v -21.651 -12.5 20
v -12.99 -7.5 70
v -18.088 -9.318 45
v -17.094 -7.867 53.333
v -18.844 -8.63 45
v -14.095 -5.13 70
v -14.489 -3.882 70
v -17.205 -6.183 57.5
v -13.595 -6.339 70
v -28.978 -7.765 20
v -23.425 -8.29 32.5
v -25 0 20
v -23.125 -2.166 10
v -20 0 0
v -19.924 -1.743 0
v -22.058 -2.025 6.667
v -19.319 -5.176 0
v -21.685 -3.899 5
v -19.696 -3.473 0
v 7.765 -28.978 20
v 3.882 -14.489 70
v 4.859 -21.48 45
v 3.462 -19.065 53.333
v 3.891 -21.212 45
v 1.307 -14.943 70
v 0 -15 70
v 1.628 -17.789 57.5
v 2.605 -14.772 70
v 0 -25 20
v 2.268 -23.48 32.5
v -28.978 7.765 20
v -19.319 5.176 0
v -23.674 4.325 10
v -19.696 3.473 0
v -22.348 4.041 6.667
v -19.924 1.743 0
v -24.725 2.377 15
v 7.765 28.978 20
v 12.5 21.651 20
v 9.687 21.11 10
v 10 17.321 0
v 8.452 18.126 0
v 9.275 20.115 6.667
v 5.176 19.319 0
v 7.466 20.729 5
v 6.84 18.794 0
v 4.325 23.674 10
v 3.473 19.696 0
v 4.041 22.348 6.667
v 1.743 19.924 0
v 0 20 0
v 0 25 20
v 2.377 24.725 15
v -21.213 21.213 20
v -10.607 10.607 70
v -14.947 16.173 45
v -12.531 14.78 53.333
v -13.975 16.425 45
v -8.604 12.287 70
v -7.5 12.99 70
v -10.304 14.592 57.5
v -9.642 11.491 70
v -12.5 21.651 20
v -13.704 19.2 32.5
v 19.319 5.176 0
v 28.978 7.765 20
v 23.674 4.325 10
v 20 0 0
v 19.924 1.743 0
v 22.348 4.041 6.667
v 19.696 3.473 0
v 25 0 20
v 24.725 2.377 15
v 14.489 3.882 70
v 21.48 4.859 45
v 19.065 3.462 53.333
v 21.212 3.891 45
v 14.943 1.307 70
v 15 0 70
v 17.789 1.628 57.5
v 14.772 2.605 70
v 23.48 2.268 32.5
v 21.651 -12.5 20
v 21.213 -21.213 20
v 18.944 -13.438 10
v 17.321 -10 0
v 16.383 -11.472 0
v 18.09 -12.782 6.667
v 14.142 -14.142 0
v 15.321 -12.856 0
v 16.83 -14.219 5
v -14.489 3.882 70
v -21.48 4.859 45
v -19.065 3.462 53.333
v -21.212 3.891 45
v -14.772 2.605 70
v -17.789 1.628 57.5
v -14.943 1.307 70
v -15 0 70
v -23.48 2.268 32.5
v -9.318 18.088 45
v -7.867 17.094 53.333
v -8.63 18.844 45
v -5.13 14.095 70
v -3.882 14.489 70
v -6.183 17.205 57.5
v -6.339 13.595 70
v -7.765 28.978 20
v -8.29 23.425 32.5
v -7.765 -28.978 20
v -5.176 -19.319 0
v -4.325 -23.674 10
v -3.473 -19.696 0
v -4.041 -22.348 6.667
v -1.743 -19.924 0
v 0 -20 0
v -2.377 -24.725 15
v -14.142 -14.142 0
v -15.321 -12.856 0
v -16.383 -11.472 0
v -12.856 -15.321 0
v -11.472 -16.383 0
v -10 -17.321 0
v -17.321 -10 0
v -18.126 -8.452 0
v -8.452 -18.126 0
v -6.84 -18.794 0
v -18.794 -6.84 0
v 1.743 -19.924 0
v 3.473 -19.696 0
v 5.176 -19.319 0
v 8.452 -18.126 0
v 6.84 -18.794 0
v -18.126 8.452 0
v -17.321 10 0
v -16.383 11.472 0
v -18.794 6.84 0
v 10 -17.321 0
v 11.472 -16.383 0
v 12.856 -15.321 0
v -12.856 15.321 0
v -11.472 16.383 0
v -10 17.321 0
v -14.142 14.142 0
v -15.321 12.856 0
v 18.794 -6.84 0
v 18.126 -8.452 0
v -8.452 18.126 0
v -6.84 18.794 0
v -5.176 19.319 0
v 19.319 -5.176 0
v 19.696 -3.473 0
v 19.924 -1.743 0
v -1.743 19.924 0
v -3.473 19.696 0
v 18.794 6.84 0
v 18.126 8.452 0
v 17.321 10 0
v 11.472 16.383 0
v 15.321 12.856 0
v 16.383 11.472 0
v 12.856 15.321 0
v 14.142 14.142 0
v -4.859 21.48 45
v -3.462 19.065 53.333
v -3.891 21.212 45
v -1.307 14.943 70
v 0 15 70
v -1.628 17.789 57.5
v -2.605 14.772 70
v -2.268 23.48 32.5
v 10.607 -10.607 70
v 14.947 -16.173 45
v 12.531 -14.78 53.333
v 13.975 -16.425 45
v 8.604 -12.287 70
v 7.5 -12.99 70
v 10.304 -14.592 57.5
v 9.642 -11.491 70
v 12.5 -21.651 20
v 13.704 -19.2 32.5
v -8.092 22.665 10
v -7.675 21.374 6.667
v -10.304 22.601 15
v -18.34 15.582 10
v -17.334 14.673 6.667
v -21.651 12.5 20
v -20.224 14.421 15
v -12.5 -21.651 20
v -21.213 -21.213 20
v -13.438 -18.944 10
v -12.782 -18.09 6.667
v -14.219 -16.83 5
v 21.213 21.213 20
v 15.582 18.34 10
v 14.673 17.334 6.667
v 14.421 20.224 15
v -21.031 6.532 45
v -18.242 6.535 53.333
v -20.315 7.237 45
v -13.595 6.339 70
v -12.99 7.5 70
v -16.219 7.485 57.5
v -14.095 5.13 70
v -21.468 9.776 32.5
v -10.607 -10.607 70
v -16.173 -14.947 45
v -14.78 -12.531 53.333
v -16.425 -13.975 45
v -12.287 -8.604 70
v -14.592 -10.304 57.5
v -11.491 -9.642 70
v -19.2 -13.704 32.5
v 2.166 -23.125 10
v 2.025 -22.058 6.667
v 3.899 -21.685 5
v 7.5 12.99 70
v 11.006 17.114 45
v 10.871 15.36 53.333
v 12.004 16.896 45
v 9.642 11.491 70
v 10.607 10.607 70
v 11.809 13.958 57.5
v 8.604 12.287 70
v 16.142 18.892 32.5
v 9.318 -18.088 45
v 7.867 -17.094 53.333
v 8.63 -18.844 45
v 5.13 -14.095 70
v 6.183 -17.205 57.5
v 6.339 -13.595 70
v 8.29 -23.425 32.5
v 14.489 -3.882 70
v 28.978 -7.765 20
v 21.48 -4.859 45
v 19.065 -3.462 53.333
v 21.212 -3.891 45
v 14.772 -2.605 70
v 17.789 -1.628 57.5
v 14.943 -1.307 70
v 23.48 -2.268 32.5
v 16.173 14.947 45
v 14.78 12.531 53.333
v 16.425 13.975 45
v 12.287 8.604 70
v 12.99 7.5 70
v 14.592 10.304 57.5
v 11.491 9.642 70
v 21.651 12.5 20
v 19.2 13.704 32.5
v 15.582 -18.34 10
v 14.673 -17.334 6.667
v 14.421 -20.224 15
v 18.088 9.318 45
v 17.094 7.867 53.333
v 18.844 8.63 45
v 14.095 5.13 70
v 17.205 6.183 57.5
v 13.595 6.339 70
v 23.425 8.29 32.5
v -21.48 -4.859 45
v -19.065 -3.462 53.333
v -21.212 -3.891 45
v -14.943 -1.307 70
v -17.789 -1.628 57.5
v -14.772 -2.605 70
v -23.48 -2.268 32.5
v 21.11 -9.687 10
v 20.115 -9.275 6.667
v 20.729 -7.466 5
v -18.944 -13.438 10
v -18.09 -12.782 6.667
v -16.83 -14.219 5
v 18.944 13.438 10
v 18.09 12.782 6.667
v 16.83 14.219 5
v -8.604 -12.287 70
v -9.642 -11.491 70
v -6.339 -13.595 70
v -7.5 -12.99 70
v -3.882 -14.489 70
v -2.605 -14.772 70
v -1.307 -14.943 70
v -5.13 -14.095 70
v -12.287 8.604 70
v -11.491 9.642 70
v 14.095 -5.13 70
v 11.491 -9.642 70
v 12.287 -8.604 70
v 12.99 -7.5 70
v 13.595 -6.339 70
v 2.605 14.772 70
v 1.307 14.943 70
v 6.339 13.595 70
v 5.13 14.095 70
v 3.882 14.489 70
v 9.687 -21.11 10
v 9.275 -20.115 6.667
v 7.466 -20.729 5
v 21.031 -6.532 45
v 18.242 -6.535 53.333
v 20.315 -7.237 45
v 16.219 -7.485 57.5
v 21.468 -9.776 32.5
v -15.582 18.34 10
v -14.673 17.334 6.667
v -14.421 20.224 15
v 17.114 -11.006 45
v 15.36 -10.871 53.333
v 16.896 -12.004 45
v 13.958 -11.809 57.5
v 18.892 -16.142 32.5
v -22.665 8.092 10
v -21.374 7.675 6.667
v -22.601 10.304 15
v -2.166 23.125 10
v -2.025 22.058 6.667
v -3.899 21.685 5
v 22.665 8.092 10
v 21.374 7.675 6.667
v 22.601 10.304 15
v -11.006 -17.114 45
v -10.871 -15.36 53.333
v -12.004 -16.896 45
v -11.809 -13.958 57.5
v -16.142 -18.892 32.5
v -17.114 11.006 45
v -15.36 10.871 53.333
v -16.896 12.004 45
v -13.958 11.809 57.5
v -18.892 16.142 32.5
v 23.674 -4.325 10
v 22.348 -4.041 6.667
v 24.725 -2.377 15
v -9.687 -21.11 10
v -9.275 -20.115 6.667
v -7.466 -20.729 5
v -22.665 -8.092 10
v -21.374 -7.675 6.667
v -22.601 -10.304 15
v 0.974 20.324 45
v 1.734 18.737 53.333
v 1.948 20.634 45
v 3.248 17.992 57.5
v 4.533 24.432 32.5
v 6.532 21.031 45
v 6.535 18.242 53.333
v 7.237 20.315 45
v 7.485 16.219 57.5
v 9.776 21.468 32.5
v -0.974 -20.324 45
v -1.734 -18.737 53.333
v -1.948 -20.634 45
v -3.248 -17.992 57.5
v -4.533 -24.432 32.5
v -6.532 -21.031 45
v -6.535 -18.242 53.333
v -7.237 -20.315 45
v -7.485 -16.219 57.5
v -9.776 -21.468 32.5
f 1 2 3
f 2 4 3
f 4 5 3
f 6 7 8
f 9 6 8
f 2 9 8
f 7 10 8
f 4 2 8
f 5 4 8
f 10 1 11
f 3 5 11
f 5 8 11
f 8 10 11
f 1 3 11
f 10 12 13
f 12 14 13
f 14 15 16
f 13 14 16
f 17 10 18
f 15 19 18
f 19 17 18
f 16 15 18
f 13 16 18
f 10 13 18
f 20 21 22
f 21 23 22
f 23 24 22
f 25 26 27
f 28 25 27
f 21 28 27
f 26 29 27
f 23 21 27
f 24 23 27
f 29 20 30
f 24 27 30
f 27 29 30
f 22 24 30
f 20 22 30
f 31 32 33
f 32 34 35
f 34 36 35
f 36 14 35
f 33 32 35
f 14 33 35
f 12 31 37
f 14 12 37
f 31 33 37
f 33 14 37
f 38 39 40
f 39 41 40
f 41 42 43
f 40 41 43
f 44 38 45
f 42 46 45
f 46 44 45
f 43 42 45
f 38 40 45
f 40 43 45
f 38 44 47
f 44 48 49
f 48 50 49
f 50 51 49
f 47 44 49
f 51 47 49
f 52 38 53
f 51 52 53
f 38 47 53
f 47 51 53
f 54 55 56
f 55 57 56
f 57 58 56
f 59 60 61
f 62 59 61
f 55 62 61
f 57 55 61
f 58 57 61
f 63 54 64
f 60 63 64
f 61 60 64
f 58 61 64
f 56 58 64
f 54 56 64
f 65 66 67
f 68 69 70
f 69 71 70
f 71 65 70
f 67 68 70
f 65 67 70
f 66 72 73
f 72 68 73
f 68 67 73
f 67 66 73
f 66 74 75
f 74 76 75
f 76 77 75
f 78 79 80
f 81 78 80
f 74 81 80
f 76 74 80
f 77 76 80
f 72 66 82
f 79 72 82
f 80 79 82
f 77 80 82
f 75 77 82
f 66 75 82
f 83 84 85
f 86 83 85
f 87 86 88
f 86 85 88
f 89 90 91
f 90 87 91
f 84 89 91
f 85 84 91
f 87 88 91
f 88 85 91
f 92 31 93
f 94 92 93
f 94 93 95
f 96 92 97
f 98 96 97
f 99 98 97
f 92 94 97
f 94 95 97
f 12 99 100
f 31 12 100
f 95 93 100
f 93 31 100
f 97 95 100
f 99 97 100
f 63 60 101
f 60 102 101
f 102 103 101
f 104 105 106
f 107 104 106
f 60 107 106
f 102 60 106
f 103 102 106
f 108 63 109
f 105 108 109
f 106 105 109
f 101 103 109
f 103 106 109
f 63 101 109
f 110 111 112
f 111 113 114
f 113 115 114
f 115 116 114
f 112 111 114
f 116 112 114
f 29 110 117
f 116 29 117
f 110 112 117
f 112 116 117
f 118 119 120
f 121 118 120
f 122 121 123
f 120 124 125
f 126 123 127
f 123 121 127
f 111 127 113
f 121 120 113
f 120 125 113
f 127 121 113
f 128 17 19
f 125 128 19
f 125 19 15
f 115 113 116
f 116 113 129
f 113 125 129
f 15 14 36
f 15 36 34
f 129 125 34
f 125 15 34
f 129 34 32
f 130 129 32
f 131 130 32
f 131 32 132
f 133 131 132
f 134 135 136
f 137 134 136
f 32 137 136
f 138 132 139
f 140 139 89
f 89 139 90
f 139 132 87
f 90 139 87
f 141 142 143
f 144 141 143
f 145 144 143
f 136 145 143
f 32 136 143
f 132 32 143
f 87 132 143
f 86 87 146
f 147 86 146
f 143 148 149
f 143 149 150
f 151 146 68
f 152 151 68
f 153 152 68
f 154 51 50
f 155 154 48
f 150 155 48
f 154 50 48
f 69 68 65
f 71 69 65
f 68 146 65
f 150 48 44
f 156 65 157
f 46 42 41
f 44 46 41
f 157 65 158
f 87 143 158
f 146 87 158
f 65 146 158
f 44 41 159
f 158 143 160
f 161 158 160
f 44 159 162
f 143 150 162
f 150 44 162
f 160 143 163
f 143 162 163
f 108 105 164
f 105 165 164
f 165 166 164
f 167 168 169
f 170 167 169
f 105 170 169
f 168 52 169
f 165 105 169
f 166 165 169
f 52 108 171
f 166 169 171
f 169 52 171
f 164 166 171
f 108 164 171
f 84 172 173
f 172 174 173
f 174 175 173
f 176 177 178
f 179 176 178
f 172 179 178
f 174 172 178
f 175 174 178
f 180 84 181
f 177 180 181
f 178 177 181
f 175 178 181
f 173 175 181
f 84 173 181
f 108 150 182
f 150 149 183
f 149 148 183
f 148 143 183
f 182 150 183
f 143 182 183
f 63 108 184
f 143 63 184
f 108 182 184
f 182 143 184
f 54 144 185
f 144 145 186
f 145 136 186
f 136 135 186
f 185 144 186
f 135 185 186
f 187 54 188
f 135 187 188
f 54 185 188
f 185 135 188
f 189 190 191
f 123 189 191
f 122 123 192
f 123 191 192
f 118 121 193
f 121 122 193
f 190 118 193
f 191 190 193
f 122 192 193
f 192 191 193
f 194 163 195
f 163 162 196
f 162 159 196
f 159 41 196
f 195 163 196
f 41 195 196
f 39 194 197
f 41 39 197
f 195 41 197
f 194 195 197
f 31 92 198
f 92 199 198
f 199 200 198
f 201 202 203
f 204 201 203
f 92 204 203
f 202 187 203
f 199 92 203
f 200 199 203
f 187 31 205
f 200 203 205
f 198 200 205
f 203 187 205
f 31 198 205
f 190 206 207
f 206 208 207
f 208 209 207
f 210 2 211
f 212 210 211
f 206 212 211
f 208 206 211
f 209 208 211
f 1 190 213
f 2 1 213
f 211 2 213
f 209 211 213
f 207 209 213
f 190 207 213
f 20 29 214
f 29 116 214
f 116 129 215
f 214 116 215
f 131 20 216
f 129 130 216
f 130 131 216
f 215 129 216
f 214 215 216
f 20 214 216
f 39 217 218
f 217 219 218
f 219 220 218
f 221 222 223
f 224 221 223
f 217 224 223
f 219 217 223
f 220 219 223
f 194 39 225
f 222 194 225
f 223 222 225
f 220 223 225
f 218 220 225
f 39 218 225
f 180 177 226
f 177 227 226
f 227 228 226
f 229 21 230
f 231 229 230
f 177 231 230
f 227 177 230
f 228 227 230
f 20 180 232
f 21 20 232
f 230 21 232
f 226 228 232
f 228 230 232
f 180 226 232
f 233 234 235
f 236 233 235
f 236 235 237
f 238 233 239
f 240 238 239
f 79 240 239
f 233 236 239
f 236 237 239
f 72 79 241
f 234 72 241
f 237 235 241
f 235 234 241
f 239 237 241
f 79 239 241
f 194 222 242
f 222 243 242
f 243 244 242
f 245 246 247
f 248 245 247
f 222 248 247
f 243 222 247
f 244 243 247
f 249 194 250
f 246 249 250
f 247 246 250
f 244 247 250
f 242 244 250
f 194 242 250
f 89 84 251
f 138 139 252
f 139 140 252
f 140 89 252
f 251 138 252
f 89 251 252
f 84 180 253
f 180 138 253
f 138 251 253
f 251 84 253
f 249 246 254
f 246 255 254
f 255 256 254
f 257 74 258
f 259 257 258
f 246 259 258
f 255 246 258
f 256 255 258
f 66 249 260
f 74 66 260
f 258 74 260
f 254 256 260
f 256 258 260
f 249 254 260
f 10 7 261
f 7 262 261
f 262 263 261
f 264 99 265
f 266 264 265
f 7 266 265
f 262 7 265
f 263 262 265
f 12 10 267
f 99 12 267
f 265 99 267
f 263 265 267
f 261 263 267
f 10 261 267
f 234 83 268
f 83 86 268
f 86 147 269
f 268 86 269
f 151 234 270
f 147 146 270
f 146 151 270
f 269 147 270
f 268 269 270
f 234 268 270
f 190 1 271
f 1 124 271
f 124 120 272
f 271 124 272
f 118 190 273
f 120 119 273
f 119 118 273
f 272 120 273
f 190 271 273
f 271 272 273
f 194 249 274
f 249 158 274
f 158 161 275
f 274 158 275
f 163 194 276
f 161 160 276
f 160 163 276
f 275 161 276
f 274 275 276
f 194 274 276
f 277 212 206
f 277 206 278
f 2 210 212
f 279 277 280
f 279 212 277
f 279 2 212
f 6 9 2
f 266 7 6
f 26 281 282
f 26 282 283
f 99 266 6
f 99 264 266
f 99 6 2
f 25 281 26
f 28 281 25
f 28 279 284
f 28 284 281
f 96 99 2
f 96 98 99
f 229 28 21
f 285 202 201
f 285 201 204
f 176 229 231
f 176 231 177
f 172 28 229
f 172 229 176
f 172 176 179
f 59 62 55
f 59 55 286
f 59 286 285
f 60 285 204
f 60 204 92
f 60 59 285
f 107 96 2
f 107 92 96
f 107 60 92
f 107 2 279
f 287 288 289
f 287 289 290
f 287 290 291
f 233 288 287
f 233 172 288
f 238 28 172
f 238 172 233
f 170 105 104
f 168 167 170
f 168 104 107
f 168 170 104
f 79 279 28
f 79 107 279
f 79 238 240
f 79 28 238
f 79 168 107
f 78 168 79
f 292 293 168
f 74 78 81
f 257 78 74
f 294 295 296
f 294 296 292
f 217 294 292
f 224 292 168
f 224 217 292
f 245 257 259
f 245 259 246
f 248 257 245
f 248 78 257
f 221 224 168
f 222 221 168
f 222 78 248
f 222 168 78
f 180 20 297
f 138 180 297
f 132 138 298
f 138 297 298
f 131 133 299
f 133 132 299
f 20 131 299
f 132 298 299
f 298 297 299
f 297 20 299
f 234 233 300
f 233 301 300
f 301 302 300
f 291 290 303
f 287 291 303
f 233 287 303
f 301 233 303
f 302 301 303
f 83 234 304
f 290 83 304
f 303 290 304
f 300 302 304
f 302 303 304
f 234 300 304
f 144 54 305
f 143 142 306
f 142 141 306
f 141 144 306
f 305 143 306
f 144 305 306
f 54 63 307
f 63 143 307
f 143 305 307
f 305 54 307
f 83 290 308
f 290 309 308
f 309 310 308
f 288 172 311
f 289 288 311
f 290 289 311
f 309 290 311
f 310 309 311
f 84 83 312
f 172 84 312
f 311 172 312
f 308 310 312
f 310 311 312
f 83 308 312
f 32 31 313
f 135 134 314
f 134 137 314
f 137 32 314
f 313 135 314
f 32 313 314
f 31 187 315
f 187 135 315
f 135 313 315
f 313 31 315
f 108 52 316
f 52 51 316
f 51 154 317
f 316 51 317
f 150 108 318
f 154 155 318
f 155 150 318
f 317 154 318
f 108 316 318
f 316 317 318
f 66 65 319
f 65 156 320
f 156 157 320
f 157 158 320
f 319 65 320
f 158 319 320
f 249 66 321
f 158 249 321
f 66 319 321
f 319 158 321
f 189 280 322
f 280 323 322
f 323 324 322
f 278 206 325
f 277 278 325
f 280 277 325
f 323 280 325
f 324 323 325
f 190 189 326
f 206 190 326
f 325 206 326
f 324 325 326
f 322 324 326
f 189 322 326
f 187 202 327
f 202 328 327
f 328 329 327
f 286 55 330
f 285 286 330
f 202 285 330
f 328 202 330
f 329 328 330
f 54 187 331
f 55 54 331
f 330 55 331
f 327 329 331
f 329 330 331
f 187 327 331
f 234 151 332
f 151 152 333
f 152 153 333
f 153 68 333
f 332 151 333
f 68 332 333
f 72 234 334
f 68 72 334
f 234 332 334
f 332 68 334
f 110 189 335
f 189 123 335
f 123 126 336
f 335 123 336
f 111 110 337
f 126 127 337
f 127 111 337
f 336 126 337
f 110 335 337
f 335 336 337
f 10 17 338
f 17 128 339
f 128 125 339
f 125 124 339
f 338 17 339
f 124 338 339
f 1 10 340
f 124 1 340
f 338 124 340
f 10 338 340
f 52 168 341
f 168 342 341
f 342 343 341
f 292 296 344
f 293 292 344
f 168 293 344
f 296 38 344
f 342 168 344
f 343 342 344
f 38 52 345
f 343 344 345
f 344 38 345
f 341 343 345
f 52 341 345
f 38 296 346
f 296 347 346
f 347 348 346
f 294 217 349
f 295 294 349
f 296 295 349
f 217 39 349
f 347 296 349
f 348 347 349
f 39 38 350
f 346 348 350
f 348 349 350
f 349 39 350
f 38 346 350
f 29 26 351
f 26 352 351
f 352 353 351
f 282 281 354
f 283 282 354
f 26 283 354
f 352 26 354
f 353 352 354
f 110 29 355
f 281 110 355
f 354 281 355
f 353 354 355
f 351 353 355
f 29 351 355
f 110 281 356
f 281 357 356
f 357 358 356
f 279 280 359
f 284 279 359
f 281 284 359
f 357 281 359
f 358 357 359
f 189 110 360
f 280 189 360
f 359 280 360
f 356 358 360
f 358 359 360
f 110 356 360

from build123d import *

# Parameters (mm, degrees)
F0_R = 20
F5_R = 15


# Not quite as in the source:
# - a feature of the source that left no trace in its solid (it failed there, or was rolled back) is left out


with BuildPart() as f3:
    # F2 (on offset) → F3 section 0
    with BuildSketch(Plane.XY.offset(20)):
        Polygon((12.5, 21.6506350946), (7.7645713531, 28.9777747887), (0, 25), (-7.7645713531, 28.9777747887), (-12.5, 21.6506350946), (-21.2132034356, 21.2132034356), (-21.6506350946, 12.5), (-28.9777747887, 7.7645713531), (-25, 0), (-28.9777747887, -7.7645713531), (-21.6506350946, -12.5), (-21.2132034356, -21.2132034356), (-12.5, -21.6506350946), (-7.7645713531, -28.9777747887), (0, -25), (7.7645713531, -28.9777747887), (12.5, -21.6506350946), (21.2132034356, -21.2132034356), (21.6506350946, -12.5), (28.9777747887, -7.7645713531), (25, 0), (28.9777747887, 7.7645713531), (21.6506350946, 12.5), (21.2132034356, 21.2132034356), align=None)
    # F0 (on Top) → F3 section 1
    with BuildSketch(Plane.XY):
        Circle(F0_R)
    loft()

    # F5 (on offset) → F6 section 0
    with BuildSketch(Plane.XY.offset(70)):
        Circle(F5_R)
    # F3_face (on face) → F6 section 1
    with BuildSketch(Plane.XY.offset(20)):
        Polygon((12.5, 21.6506350946), (7.7645713531, 28.9777747887), (0, 25), (-7.7645713531, 28.9777747887), (-12.5, 21.6506350946), (-21.2132034356, 21.2132034356), (-21.6506350946, 12.5), (-28.9777747887, 7.7645713531), (-25, 0), (-28.9777747887, -7.7645713531), (-21.6506350946, -12.5), (-21.2132034356, -21.2132034356), (-12.5, -21.6506350946), (-7.7645713531, -28.9777747887), (0, -25), (7.7645713531, -28.9777747887), (12.5, -21.6506350946), (21.2132034356, -21.2132034356), (21.6506350946, -12.5), (28.9777747887, -7.7645713531), (25, 0), (28.9777747887, 7.7645713531), (21.6506350946, 12.5), (21.2132034356, 21.2132034356), align=None)
    loft()


solid = f3.part
